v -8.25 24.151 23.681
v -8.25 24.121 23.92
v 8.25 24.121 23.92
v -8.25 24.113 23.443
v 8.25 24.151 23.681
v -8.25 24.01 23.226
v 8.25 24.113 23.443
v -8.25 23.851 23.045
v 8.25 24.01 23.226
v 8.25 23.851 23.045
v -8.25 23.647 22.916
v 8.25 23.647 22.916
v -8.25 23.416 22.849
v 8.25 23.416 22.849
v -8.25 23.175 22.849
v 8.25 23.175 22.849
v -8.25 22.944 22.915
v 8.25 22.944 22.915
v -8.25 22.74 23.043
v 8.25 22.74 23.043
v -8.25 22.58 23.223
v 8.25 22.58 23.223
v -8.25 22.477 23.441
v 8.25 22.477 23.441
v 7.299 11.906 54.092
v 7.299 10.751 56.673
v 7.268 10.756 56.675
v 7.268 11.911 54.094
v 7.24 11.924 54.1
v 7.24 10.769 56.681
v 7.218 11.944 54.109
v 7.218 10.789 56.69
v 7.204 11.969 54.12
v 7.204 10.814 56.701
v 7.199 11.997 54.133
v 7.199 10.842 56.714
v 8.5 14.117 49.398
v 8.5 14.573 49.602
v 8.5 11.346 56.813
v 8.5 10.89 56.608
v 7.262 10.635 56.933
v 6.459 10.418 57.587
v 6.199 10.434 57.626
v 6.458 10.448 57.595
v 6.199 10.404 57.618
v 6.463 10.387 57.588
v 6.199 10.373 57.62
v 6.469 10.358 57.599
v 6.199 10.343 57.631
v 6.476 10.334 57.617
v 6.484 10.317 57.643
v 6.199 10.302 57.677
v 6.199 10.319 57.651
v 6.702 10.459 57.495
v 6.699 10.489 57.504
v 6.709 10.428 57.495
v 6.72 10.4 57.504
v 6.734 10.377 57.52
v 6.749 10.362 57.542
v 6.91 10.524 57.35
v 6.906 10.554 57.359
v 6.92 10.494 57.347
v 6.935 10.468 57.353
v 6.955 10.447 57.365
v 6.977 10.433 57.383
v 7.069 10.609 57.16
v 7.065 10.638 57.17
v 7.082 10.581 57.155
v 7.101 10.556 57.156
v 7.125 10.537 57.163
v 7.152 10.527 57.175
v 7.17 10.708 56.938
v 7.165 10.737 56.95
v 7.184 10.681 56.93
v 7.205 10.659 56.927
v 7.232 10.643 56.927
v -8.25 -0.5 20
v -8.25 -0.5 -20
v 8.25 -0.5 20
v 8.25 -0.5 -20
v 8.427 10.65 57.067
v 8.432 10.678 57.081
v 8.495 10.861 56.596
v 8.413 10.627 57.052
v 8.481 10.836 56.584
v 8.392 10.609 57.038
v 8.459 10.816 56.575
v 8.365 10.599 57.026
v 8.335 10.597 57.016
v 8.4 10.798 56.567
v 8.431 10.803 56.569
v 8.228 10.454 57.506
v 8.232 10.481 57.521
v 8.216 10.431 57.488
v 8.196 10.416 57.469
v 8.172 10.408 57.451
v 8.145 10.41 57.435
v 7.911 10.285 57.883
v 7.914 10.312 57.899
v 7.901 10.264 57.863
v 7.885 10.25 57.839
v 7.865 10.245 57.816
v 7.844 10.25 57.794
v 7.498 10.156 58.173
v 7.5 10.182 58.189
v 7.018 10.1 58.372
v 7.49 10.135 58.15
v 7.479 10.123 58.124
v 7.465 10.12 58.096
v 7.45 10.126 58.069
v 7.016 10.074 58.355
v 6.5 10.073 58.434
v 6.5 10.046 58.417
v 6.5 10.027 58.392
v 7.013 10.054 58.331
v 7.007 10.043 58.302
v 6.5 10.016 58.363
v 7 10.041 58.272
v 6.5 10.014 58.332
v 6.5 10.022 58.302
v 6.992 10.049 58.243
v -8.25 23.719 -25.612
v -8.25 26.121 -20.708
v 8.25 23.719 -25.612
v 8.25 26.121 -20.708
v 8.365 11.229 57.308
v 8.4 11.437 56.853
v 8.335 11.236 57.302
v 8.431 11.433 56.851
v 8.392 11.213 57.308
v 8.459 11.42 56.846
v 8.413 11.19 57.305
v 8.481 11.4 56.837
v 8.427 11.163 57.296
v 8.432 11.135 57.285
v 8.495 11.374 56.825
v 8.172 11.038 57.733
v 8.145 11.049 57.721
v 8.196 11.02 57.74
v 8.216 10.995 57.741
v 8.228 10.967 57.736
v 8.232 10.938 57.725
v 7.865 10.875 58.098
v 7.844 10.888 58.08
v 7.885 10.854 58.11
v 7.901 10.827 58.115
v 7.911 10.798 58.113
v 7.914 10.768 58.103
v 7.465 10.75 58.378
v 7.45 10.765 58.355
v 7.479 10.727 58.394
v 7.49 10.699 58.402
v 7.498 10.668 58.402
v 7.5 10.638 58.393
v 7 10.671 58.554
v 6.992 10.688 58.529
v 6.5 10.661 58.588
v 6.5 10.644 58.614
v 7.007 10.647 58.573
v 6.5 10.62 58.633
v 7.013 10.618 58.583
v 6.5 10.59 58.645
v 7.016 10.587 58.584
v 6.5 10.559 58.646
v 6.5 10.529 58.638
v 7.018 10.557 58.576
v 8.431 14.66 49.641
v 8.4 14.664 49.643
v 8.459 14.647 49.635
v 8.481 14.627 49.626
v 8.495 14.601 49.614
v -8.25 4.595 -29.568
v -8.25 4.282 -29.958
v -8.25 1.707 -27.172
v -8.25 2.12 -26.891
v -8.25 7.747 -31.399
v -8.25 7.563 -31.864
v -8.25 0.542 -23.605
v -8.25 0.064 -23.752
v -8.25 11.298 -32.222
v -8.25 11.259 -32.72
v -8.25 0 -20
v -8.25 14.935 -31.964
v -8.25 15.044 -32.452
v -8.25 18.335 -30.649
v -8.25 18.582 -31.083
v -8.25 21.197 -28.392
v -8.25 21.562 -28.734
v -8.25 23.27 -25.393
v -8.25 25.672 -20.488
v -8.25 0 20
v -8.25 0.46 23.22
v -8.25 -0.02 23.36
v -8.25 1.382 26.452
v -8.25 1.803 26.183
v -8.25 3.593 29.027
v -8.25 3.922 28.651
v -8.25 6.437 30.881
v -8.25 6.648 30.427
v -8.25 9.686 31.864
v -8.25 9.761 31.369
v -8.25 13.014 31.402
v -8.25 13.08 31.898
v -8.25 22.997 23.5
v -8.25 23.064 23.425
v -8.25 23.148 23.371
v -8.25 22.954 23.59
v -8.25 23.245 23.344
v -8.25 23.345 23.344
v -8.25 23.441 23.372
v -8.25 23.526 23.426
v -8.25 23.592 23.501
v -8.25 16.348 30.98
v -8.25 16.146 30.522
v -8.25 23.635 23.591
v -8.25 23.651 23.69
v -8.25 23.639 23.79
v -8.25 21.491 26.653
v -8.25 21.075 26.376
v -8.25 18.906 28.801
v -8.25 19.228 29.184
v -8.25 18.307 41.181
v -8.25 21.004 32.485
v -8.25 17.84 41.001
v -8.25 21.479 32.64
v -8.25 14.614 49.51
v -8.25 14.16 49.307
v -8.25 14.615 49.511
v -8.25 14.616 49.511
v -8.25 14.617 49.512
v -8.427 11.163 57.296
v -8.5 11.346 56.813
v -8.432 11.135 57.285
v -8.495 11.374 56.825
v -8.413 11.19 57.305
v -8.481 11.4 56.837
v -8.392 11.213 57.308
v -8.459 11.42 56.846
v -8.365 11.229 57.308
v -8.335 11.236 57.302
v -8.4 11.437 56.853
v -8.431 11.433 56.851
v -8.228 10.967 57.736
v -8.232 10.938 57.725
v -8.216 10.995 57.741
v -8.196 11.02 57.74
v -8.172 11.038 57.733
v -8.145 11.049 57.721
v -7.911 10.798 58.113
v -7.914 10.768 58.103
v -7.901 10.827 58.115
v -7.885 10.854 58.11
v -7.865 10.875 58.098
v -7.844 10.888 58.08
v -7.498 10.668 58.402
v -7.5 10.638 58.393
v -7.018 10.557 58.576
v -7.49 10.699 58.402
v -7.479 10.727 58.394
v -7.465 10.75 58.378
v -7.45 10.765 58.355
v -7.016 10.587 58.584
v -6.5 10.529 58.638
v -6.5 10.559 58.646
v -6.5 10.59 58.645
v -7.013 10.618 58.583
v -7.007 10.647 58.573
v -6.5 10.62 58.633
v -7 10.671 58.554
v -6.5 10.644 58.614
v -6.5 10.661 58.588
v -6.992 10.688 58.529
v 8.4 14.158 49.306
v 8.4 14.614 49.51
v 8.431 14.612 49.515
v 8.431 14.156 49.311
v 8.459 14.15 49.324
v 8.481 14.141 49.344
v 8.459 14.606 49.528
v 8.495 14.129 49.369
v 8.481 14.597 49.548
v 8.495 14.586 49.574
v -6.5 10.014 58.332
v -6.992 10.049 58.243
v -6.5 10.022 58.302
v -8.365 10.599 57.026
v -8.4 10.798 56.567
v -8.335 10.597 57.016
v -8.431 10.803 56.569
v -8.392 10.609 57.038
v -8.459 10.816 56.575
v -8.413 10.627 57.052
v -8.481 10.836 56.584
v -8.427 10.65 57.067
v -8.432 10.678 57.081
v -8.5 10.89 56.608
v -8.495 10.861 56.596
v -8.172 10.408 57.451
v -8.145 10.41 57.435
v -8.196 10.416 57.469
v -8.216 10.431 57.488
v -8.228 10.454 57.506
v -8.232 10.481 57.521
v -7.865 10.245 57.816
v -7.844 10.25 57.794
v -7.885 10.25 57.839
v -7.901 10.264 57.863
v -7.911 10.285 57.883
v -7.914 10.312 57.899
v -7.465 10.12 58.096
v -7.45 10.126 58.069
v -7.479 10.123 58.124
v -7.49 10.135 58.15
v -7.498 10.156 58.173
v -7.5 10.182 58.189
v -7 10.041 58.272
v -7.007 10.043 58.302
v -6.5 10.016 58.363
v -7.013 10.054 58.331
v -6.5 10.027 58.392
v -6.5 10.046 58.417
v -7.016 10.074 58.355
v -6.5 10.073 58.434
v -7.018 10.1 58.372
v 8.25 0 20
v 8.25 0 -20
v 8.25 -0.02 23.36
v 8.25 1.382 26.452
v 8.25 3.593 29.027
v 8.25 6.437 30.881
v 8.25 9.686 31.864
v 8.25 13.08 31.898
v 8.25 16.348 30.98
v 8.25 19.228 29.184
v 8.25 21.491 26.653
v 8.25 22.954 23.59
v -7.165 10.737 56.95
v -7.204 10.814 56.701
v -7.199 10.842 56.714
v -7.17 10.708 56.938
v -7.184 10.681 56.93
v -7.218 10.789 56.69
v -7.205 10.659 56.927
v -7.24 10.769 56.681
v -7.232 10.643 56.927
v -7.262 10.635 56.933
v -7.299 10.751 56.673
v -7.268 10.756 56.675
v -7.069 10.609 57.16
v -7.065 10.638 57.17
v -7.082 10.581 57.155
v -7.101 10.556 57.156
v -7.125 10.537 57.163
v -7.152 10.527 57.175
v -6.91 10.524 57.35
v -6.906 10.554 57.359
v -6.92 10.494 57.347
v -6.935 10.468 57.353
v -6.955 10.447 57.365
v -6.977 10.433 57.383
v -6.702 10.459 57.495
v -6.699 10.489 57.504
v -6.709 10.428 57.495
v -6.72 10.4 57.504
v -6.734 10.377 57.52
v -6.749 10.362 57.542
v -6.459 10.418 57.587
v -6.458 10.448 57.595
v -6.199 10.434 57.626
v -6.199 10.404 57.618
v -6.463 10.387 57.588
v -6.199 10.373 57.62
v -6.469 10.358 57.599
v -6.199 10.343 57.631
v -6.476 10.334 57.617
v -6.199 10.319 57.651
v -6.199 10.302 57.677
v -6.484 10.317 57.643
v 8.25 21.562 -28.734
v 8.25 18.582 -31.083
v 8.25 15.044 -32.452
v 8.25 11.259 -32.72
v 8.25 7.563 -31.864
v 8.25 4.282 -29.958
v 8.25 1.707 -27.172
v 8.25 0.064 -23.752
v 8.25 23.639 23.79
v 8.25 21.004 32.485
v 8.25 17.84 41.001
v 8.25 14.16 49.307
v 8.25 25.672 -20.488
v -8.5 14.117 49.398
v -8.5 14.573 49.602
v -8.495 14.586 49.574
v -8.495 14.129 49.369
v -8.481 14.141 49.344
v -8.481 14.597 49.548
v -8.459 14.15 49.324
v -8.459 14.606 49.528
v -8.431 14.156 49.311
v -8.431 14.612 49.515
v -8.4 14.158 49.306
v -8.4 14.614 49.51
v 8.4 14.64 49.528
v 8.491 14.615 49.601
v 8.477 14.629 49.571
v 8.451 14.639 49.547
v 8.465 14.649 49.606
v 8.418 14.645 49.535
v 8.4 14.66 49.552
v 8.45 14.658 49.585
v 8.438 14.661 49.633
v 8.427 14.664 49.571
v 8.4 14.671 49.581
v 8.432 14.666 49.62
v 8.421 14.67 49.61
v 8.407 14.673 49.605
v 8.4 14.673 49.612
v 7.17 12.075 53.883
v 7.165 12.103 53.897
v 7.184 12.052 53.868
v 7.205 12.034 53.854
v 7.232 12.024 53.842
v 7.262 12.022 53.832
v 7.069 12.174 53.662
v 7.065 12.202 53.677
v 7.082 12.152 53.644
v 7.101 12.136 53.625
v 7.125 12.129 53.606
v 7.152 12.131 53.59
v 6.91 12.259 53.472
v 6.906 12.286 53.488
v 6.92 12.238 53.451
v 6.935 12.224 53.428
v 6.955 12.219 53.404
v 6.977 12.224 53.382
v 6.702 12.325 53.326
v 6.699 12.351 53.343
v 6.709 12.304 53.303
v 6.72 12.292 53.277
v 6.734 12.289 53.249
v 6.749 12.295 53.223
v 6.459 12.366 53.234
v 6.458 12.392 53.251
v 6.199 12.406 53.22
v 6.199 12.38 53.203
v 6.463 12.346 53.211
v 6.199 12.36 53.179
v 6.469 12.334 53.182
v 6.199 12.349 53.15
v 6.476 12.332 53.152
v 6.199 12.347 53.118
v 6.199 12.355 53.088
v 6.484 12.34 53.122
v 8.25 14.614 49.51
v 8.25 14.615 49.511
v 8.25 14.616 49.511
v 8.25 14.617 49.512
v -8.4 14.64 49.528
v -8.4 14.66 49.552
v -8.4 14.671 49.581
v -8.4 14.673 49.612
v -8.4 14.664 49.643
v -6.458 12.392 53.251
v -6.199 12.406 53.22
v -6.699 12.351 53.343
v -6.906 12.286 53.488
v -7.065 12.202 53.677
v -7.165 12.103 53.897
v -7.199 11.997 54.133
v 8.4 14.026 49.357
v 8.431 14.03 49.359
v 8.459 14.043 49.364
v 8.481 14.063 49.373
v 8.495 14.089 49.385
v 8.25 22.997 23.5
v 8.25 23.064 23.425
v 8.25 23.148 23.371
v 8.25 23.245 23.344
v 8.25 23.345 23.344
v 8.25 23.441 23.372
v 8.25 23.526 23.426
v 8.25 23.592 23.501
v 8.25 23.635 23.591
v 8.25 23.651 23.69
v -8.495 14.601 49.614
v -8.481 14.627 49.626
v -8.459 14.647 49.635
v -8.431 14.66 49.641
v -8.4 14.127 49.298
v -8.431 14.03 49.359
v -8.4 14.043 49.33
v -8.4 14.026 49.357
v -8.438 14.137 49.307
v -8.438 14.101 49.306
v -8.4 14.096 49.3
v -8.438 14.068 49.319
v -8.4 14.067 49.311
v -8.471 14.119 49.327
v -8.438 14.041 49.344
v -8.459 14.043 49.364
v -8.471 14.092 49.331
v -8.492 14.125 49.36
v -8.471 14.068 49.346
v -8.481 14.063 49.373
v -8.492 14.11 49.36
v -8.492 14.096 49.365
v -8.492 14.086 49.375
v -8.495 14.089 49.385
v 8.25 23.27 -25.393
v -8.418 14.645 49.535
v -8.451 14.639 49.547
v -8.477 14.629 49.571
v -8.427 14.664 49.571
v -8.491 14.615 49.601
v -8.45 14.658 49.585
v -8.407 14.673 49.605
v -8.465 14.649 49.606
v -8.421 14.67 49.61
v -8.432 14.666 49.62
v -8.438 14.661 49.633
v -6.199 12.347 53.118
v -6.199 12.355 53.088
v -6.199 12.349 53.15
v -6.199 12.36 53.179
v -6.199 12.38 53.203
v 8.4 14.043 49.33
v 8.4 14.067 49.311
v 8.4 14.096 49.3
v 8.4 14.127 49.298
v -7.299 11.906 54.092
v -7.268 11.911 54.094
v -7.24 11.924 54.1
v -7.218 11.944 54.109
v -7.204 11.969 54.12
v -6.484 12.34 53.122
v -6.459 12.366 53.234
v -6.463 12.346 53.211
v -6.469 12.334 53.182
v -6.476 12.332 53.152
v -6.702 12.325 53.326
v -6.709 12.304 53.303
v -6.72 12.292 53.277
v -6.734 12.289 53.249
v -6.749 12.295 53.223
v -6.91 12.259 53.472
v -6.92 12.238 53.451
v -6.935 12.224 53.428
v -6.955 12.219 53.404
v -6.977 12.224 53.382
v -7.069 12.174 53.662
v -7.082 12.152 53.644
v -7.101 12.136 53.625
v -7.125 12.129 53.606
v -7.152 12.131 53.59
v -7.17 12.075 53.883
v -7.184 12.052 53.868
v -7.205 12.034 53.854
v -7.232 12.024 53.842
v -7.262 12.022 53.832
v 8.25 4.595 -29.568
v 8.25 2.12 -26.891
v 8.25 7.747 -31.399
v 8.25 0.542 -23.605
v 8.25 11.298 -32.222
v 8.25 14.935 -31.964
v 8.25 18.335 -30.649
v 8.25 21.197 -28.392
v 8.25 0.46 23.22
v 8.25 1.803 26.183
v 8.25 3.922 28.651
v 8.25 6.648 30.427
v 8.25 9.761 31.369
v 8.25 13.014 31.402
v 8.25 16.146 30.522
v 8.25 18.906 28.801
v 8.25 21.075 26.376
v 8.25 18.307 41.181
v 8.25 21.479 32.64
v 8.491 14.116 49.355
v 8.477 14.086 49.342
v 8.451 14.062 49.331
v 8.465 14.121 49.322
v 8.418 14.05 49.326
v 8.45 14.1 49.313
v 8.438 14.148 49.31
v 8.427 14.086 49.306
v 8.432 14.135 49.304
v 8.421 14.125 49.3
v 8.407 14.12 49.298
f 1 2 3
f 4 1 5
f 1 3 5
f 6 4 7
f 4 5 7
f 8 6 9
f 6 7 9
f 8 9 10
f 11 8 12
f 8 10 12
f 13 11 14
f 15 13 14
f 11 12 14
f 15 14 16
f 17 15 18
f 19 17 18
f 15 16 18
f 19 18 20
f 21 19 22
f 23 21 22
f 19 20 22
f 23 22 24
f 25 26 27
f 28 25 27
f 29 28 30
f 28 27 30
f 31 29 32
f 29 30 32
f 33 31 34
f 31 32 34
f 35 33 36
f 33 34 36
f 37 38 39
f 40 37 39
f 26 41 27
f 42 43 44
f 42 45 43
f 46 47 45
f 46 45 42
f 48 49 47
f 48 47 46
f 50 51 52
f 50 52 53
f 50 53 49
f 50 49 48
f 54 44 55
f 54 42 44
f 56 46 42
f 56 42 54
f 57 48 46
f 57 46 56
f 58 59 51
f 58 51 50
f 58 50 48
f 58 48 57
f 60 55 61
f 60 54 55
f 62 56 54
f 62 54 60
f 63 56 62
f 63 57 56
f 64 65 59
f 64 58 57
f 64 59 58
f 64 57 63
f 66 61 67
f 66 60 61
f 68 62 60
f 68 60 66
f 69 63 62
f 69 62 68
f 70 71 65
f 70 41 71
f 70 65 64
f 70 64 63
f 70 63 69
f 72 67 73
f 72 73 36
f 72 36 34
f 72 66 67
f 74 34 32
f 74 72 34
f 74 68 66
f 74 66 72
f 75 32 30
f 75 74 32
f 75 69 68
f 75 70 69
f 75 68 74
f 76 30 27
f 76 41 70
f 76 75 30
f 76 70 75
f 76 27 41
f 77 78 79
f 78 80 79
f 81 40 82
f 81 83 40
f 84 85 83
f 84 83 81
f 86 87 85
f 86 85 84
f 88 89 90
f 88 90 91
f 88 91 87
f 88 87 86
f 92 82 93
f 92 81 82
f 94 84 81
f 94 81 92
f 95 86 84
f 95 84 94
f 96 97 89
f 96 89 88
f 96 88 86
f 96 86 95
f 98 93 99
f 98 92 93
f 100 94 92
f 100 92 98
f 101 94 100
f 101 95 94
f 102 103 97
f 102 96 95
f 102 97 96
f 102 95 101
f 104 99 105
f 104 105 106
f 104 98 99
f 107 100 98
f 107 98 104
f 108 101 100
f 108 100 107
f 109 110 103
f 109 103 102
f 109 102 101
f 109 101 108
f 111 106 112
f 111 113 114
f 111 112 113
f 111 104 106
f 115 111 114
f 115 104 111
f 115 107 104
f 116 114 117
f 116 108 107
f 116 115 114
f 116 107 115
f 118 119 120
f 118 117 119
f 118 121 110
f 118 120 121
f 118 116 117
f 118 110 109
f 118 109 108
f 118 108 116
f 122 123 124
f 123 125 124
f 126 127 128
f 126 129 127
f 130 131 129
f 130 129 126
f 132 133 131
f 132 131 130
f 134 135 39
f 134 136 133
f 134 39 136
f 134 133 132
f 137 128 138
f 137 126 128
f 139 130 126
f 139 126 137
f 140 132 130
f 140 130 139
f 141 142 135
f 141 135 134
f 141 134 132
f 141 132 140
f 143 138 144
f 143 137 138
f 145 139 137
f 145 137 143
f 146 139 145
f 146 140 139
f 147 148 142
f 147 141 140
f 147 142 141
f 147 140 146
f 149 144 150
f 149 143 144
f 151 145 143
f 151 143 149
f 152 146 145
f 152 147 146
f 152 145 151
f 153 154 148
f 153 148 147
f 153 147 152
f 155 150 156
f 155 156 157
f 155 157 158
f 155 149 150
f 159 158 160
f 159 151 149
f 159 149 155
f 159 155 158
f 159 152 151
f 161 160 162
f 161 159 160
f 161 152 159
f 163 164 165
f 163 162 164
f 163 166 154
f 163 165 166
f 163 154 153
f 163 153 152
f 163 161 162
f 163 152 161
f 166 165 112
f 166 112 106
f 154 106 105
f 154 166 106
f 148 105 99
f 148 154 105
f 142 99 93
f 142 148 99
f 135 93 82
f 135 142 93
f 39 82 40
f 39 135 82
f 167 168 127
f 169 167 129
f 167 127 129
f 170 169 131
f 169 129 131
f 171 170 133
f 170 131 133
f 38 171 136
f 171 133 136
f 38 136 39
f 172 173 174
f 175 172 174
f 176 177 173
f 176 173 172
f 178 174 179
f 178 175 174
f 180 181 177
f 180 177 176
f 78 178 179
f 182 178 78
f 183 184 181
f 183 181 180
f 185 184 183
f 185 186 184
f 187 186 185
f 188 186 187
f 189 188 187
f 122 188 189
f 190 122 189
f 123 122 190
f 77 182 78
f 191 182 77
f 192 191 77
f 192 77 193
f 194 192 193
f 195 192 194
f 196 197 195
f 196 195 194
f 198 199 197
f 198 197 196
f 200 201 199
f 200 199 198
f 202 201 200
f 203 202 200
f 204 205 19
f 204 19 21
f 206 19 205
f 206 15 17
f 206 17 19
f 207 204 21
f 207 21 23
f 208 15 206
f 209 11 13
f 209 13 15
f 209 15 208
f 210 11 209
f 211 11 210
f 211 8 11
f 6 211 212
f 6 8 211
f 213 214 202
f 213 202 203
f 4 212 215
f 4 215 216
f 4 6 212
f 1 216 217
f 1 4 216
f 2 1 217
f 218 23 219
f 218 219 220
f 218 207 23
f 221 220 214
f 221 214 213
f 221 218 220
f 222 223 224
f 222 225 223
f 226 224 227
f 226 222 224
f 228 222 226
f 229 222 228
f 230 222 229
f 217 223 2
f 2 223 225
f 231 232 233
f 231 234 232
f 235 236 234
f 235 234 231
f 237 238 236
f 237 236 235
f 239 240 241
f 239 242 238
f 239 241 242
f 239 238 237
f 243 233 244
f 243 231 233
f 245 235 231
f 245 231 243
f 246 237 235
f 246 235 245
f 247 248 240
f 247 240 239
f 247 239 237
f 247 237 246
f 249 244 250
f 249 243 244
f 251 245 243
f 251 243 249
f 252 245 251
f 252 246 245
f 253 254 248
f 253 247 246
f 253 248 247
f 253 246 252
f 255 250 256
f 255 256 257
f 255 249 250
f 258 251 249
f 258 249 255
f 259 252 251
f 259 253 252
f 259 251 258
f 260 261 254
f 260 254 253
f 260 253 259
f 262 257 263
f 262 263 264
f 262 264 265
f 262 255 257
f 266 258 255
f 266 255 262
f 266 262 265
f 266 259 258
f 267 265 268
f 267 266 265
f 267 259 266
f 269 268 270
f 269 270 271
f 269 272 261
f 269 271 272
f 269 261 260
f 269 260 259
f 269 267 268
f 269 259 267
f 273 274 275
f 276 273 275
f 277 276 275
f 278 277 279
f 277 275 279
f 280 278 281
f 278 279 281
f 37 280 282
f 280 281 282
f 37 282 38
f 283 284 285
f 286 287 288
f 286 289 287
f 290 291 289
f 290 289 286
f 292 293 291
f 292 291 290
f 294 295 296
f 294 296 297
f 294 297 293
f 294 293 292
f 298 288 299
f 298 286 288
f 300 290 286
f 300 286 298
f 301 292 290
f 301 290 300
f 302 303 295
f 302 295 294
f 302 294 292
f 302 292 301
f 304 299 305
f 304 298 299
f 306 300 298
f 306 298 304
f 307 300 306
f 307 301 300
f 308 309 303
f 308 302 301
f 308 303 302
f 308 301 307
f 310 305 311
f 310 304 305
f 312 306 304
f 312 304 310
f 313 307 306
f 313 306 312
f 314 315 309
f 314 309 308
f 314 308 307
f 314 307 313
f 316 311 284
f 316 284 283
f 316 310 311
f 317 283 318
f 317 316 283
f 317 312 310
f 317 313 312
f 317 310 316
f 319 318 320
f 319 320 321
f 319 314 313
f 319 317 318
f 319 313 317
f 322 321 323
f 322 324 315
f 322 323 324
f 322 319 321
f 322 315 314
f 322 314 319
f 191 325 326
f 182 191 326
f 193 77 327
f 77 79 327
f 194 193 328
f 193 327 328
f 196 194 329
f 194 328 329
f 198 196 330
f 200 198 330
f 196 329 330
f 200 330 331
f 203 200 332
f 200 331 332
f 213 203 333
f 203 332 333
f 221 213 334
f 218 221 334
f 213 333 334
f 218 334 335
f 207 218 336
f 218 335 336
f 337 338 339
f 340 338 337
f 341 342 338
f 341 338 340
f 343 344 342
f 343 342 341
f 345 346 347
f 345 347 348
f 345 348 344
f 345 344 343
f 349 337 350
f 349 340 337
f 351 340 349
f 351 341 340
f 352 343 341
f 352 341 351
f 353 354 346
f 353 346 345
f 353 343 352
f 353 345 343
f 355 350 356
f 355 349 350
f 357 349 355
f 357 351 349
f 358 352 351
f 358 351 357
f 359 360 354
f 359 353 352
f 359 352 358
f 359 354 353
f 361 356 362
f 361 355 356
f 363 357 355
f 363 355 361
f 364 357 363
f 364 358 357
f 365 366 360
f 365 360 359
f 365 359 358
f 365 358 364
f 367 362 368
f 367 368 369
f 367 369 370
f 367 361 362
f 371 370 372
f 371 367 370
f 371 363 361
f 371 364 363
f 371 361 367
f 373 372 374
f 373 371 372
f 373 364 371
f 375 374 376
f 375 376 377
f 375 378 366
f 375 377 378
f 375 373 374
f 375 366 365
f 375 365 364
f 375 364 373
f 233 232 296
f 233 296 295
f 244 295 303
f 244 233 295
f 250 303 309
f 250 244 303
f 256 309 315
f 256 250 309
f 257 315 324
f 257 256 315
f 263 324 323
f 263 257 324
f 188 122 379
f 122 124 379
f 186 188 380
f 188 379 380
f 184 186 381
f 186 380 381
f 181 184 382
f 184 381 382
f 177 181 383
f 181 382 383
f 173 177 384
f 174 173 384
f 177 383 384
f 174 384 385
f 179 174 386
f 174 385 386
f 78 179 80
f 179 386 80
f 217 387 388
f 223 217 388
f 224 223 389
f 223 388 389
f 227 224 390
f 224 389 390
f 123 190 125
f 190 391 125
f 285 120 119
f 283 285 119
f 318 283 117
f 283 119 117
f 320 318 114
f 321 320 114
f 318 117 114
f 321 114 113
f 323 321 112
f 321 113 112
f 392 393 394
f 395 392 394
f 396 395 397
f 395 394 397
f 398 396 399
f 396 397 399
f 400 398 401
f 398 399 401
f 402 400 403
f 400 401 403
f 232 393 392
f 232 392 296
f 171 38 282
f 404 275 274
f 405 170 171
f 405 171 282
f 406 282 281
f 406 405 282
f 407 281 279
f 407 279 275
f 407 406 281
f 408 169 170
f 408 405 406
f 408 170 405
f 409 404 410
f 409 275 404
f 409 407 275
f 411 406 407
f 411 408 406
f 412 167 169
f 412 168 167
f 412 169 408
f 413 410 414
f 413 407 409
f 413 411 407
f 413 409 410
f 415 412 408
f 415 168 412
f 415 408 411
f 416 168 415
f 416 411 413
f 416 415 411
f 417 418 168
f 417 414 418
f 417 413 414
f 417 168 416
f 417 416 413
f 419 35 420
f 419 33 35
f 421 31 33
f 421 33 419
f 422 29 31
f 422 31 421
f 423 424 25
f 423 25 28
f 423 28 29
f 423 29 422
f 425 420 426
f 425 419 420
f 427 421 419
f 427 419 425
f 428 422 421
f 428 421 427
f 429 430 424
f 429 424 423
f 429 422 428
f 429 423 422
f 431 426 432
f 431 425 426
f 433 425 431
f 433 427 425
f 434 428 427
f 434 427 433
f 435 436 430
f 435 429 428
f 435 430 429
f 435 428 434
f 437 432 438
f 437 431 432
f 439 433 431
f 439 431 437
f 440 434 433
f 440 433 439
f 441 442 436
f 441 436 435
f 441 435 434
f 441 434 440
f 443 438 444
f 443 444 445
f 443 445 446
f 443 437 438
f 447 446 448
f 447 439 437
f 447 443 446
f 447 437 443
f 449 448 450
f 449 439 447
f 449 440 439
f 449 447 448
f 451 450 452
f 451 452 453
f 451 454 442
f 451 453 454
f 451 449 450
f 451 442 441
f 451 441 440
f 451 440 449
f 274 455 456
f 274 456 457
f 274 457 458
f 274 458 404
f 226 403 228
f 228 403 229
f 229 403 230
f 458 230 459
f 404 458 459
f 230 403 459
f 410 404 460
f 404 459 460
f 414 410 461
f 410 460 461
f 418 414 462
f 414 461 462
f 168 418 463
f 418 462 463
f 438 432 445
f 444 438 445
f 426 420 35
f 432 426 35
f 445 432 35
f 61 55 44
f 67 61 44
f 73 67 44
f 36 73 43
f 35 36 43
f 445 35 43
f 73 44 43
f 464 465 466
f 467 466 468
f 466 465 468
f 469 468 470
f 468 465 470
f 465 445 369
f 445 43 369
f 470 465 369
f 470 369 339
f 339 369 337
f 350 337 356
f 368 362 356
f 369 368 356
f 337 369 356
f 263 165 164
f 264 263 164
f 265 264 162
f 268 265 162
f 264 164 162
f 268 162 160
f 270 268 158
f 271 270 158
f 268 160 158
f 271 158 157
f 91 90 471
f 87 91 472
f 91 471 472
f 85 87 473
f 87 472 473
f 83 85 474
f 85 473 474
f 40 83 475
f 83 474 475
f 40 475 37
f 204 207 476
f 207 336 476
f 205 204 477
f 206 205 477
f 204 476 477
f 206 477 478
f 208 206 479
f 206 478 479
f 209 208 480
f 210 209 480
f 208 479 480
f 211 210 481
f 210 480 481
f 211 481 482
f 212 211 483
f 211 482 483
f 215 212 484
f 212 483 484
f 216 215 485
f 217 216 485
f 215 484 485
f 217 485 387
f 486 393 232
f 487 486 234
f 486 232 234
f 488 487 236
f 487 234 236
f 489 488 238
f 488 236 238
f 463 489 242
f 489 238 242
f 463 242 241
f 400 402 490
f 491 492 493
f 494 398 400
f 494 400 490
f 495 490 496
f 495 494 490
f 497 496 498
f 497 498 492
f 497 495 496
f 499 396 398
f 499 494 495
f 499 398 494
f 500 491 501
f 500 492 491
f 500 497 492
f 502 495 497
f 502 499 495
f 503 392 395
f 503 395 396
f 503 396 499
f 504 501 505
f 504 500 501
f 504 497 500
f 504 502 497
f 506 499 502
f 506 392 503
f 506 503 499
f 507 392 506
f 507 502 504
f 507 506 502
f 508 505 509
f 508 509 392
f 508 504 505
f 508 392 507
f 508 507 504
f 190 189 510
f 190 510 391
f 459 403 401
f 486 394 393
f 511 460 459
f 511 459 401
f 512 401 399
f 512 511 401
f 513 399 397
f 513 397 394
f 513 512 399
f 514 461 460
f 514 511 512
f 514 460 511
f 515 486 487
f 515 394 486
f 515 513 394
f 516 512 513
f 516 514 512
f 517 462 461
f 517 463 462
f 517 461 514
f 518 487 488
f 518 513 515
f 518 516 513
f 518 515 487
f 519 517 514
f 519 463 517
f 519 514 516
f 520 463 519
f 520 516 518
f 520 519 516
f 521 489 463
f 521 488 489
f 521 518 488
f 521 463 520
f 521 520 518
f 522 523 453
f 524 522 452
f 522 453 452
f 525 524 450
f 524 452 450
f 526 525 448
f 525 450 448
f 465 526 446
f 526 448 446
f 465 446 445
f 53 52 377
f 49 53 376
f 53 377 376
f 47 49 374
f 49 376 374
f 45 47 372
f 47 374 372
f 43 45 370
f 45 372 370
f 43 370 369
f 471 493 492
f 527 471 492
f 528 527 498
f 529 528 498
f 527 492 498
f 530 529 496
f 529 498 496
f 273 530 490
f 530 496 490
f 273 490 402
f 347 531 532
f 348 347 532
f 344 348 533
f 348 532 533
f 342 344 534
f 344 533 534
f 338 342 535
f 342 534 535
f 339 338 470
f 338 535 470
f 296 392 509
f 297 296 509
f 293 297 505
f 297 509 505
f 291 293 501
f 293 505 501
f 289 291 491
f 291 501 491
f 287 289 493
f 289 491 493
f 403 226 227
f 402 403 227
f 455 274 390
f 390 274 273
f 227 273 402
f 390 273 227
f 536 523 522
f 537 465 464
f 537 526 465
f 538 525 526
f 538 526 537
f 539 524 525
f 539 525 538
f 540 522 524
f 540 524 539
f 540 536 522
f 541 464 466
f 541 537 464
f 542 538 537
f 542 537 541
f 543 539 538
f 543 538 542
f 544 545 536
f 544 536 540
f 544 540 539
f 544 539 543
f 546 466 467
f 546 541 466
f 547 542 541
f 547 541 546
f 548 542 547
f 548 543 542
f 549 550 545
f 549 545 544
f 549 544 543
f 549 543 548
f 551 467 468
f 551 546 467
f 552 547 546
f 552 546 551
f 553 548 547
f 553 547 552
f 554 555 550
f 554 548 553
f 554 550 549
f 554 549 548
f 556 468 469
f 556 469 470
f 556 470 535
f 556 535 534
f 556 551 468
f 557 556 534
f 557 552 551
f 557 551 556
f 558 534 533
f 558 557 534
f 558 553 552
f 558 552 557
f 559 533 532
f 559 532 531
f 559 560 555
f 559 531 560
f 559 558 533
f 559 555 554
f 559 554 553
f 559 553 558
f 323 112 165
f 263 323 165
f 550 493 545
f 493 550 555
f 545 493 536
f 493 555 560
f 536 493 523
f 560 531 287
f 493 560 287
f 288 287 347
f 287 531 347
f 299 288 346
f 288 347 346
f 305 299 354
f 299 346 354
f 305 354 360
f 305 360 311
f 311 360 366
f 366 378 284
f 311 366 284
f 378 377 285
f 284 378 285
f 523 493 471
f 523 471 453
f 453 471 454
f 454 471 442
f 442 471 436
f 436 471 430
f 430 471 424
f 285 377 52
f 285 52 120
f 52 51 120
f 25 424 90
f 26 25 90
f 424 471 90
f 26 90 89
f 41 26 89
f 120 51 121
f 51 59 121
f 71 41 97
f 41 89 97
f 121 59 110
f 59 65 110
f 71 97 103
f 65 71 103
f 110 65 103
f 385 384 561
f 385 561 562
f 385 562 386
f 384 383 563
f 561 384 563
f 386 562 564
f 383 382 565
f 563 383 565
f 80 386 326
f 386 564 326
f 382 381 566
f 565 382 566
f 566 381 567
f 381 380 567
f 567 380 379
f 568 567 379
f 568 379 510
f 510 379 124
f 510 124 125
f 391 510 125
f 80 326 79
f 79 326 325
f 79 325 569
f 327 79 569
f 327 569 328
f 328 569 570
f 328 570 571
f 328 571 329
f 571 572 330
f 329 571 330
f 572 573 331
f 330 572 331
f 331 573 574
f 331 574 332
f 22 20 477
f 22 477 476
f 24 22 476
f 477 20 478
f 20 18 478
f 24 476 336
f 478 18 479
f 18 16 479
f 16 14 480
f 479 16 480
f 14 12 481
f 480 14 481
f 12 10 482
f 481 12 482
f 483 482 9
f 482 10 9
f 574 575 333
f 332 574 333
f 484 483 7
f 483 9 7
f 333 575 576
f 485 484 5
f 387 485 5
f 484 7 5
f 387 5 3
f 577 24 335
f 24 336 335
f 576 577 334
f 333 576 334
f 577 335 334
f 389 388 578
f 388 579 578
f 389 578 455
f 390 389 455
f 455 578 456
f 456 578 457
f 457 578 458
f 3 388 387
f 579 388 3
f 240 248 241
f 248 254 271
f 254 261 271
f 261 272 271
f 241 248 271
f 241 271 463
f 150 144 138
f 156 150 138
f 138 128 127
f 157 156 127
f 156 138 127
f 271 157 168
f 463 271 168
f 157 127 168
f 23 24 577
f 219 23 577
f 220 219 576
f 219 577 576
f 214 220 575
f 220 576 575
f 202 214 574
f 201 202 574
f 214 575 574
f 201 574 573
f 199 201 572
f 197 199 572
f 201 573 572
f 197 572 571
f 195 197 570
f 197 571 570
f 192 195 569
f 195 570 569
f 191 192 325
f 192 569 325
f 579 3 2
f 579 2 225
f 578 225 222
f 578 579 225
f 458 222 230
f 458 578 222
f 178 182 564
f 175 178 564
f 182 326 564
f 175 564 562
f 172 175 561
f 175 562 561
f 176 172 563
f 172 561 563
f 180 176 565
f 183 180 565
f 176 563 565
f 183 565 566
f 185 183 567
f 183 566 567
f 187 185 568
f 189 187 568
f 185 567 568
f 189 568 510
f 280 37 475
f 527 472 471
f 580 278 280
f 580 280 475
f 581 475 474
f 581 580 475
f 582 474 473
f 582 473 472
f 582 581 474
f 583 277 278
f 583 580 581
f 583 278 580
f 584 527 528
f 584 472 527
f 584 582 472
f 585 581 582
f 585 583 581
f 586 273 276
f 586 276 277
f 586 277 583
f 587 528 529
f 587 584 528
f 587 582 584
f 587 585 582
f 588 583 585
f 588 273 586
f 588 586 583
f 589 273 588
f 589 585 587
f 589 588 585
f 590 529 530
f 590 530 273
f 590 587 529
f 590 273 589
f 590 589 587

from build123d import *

# Parameters (mm, degrees)
BOSS_EXTRUDE1_DEPTH = 8.25
BOSS_EXTRUDE2_DEPTH = 8.5
FILLET2_R           = 2
CUT_EXTRUDE1_DEPTH  = 0.1
FILLET1_R           = 0.1


with BuildPart() as part:
    # Sketch1 → Boss-Extrude1 (new, symmetric)
    with BuildSketch(Plane(origin=(0, 0, 0), x_dir=(0, 0, -1), z_dir=(1, 0, 0))):
        with BuildLine():
            Line((-20, 0), (20, 0))
            ThreePointArc((20, 0), (31.94314613143427, 9.491936676512388), (25.392516821689124, 23.269630860737195))
            Line((25.392516821689124, 23.269630860737195), (20.48767915496346, 25.67194333522964))
            Line((20.48767915496346, 25.67194333522964), (20.707608671089492, 26.12097675039667))
            Line((20.707608671089492, 26.12097675039667), (25.612446337815154, 23.71866427590423))
            ThreePointArc((25.612446337815154, 23.71866427590423), (32.4302378618011, 9.379057775878826), (20, -0.5))
            Line((20, -0.5), (-20, -0.4999999999999987))
            ThreePointArc((-20, -0.4999999999999987), (-31.863566841643475, 9.685729623859952), (-23.590234900340555, 22.953935409328388))
            ThreePointArc((-23.590234900340555, 22.953935409328388), (-23.354479596787012, 23.394160454012642), (-23.789870300203464, 23.638728621400347))
            ThreePointArc((-23.789870300203464, 23.638728621400347), (-36.8961810366091, 19.4394741124151), (-49.55557214404263, 14.040498622612501))
            Line((-49.55557214404263, 14.040498622612501), (-49.77289846768594, 14.4907977110545))
            ThreePointArc((-49.77289846768594, 14.4907977110545), (-37.070723460551015, 19.908019672894), (-23.920118407045663, 24.1214660558966))
            ThreePointArc((-23.920118407045663, 24.1214660558966), (-22.874461521184195, 23.534098465627046), (-23.440663680772627, 22.47683117514367))
            ThreePointArc((-23.440663680772627, 22.47683117514367), (-31.36932392713061, 9.761386358218672), (-20, 0))
        make_face()
    extrude(amount=BOSS_EXTRUDE1_DEPTH, both=True)

    # Sketch2 → Boss-Extrude2 (add, symmetric)
    with BuildSketch(Plane(origin=(0, 0, 0), x_dir=(0, 0, -1), z_dir=(1, 0, 0))):
        Polygon((-49.26537752455312, 14.066353693944993), (-58.392962295280306, 9.981357212528026), (-58.67891204897949, 10.620288146478929), (-49.5513272782523, 14.705284627895898), align=None)
    extrude(amount=BOSS_EXTRUDE2_DEPTH, both=True)

    # Fillet2
    fillet2_edges = [part.edges().sort_by_distance(p)[0] for p in [
        (-8.5, 10.300822679503478, 58.5359371721299),
        (8.5, 10.300822679503478, 58.5359371721299),
    ]]
    fillet(fillet2_edges, radius=FILLET2_R)

    # Sketch3 → Cut-Extrude1 (cut)
    with BuildSketch(Plane(origin=(0, 30.088237033082944, 13.465812205476922), x_dir=(1, 0, 0), z_dir=(0, -0.9127584770727193, -0.40849964814169676))):
        with BuildLine():
            Line((-6.1992171672518035, 48.336758954326044), (6.1992171672518035, 48.336758954326044))
            ThreePointArc((6.1992171672518035, 48.336758954326044), (6.9063239484383585, 48.04386573551259), (7.199217167251811, 47.33675895432604))
            Line((7.199217167251811, 47.33675895432604), (7.199217167251811, 44.50945894575458))
            ThreePointArc((7.199217167251811, 44.50945894575458), (6.9063239484383585, 43.80235216456803), (6.1992171672518035, 43.509458945754574))
            Line((6.1992171672518035, 43.509458945754574), (-6.1992171672518035, 43.509458945754574))
            ThreePointArc((-6.1992171672518035, 43.509458945754574), (-6.9063239484383585, 43.80235216456803), (-7.199217167251811, 44.50945894575458))
            Line((-7.199217167251811, 44.50945894575458), (-7.199217167251811, 47.33675895432604))
            ThreePointArc((-7.199217167251811, 47.33675895432604), (-6.906323948438358, 48.04386573551259), (-6.1992171672518035, 48.336758954326044))
        make_face()
    extrude(amount=-CUT_EXTRUDE1_DEPTH, mode=Mode.SUBTRACT)

    # Fillet1
    # the kernel refuses this fillet: 0.1 mm, written as the material it takes off along each edge
    with BuildSketch(Plane(origin=(-8.4, 14.573158815374455, 49.601753161145396), x_dir=(-1, 0, 0), z_dir=(0, 0.9127584770727193, 0.40849964814169704))) as fillet1_piece_1_section:
        Polygon((0, 0), (FILLET1_R * 1.02, 0), (FILLET1_R * 1.02, -FILLET1_R * 1.02), (0, -FILLET1_R * 1.02), align=None)
    fillet1_piece_1 = extrude(amount=FILLET1_R * 1.02, mode=Mode.PRIVATE)
    fillet1_piece_1 = fillet1_piece_1 - Plane(origin=(-8.4, 14.573158815374455, 49.601753161145396), x_dir=(0.7071067811865475, -0.28885287131331006, 0.6454177087236268), z_dir=(0, 0.9127584770727193, 0.40849964814169704)) * Sphere(FILLET1_R, mode=Mode.PRIVATE)
    add(fillet1_piece_1, mode=Mode.SUBTRACT)
    with BuildSketch(Plane(origin=(-8.4, 14.116779576838097, 49.39750333707456), x_dir=(0, 0.4084996481416934, -0.912758477072721), z_dir=(-1, 0, 0))) as fillet1_piece_2_section:
        Polygon((0, 0), (FILLET1_R * 1.02, 0), (FILLET1_R * 1.02, FILLET1_R * 1.02), (3.9e-16, FILLET1_R * 1.02), align=None)
    fillet1_piece_2 = extrude(amount=FILLET1_R * 1.02, mode=Mode.PRIVATE)
    fillet1_piece_2 = fillet1_piece_2 - Plane(origin=(-8.4, 14.116779576838097, 49.39750333707456), x_dir=(0, 0.35656483741031497, 0.9342705800369375), z_dir=(-1, 0, 0)) * Sphere(FILLET1_R, mode=Mode.PRIVATE)
    add(fillet1_piece_2, mode=Mode.SUBTRACT)
    with BuildSketch(Plane(origin=(8.4, 14.116779576838095, 49.39750333707456), x_dir=(1, 0, 0), z_dir=(0, 0.4084996481416934, -0.912758477072721))) as fillet1_piece_3_section:
        Polygon((0, 0), (FILLET1_R * 1.02, 0), (FILLET1_R * 1.02, FILLET1_R * 1.02), (0, FILLET1_R * 1.02), align=None)
    fillet1_piece_3 = extrude(amount=FILLET1_R * 1.02, mode=Mode.PRIVATE)
    fillet1_piece_3 = fillet1_piece_3 - Plane(origin=(8.4, 14.116779576838095, 49.39750333707456), x_dir=(-0.7071067811865475, 0.6454177087236256, 0.2888528713133125), z_dir=(0, 0.4084996481416934, -0.912758477072721)) * Sphere(FILLET1_R, mode=Mode.PRIVATE)
    add(fillet1_piece_3, mode=Mode.SUBTRACT)
    with BuildSketch(Plane(origin=(8.4, 14.573158815374455, 49.601753161145396), x_dir=(0, 0.4084996481416934, -0.912758477072721), z_dir=(0, 0.9127584770727193, 0.40849964814169704))) as fillet1_piece_4_section:
        Polygon((0, 0), (FILLET1_R * 1.02, 0), (FILLET1_R * 1.02, -FILLET1_R * 1.02), (0, -FILLET1_R * 1.02), align=None)
    fillet1_piece_4 = extrude(amount=FILLET1_R * 1.02, mode=Mode.PRIVATE)
    fillet1_piece_4 = fillet1_piece_4 - Plane(origin=(8.4, 14.573158815374455, 49.601753161145396), x_dir=(-0.7071067811865475, -0.28885287131331006, 0.6454177087236268), z_dir=(0, 0.9127584770727193, 0.40849964814169704)) * Sphere(FILLET1_R, mode=Mode.PRIVATE)
    add(fillet1_piece_4, mode=Mode.SUBTRACT)
    with BuildSketch(Plane(origin=(-8.5, 11.43728744276232, 56.853395094834056), x_dir=(1, 0, 0), z_dir=(0, 0.40849964814169704, -0.9127584770727193))) as fillet1_piece_5:
        with BuildLine():
            CenterArc((FILLET1_R, FILLET1_R), FILLET1_R, 180, 90)
            Line((0, FILLET1_R), (0, 0))
            Line((0, 0), (FILLET1_R, 0))
        make_face()
    extrude(amount=7.900000000000008, mode=Mode.SUBTRACT)
    with BuildSketch(Plane(origin=(-8.5, 14.025503729130824, 49.35665337226039), x_dir=(0, 0.9127584770727193, 0.40849964814169687), z_dir=(0, -0.40849964814169687, 0.9127584770727193))) as fillet1_piece_6:
        with BuildLine():
            CenterArc((FILLET1_R, -FILLET1_R), FILLET1_R, 90, 90)
            Line((0, -FILLET1_R), (0, 0))
            Line((0, 0), (FILLET1_R, 0))
        make_face()
    extrude(amount=7.9, mode=Mode.SUBTRACT)
    with BuildSketch(Plane(origin=(-8.5, 14.614008780188621, 49.51047731343813), x_dir=(0, -0.40849964814169337, 0.9127584770727208), z_dir=(0, -0.912758477072721, -0.4084996481416934))) as fillet1_piece_7:
        with BuildLine():
            CenterArc((FILLET1_R, -FILLET1_R), FILLET1_R, 90, 90)
            Line((1.45e-15, -FILLET1_R), (0, 0))
            Line((0, 0), (FILLET1_R, 0))
        make_face()
    extrude(amount=0.4999999999999936, mode=Mode.SUBTRACT)
    with BuildSketch(Plane(origin=(6.5, 10.620288146478929, 58.67891204897949), x_dir=(0, 0.4084996481416779, -0.9127584770727277), z_dir=(-1, 0, 0))) as fillet1_piece_8:
        with BuildLine():
            CenterArc((FILLET1_R, FILLET1_R), FILLET1_R, 179.99999999999815, 89.99999999999955)
            Line((2.51e-15, FILLET1_R), (0, 0))
            Line((0, 0), (FILLET1_R, 0))
        make_face()
    extrude(amount=13, mode=Mode.SUBTRACT)
    with BuildSketch(Plane(origin=(6.5, 9.981357212528026, 58.392962295280306), x_dir=(0, 0.9127584770727145, 0.40849964814170747), z_dir=(-1, 0, 0))) as fillet1_piece_9:
        with BuildLine():
            CenterArc((FILLET1_R, FILLET1_R), FILLET1_R, 179.9999999999996, 90.00000000000131)
            Line((0, FILLET1_R), (0, 0))
            Line((0, 0), (FILLET1_R, 0))
        make_face()
    extrude(amount=13, mode=Mode.SUBTRACT)
    with BuildSketch(Plane(origin=(8.5, 14.025503729130824, 49.35665337226039), x_dir=(0, 0.9127584770727193, 0.40849964814169687), z_dir=(0, -0.40849964814169687, 0.9127584770727193))) as fillet1_piece_10:
        with BuildLine():
            CenterArc((FILLET1_R, FILLET1_R), FILLET1_R, 180, 90)
            Line((0, FILLET1_R), (0, 0))
            Line((0, 0), (FILLET1_R, 0))
        make_face()
    extrude(amount=7.9, mode=Mode.SUBTRACT)
    with BuildSketch(Plane(origin=(8.5, 11.43728744276232, 56.853395094834056), x_dir=(-1, 0, 0), z_dir=(0, 0.40849964814169704, -0.9127584770727193))) as fillet1_piece_11:
        with BuildLine():
            CenterArc((FILLET1_R, -FILLET1_R), FILLET1_R, 90, 90)
            Line((0, -FILLET1_R), (0, 0))
            Line((0, 0), (FILLET1_R, 0))
        make_face()
    extrude(amount=7.900000000000008, mode=Mode.SUBTRACT)
    with BuildSketch(Plane(origin=(8.5, 14.614008780188621, 49.51047731343813), x_dir=(-1, -5.93e-15, 1.325e-14), z_dir=(0, -0.912758477072721, -0.4084996481416934))) as fillet1_piece_12:
        with BuildLine():
            CenterArc((FILLET1_R, -FILLET1_R), FILLET1_R, 90.00000000000082, 89.99999999999918)
            Line((1.45e-15, -FILLET1_R), (0, 0))
            Line((0, 0), (FILLET1_R, 0))
        make_face()
    extrude(amount=0.499999999999992, mode=Mode.SUBTRACT)
    with BuildSketch(Plane(origin=(-8.4, 14.066353693944993, 49.26537752455312), x_dir=(0, 0.9127584770727116, 0.40849964814171413), z_dir=(1, 0, 0))) as fillet1_piece_13:
        with BuildLine():
            CenterArc((FILLET1_R, FILLET1_R), FILLET1_R, 180, 89.99999999999864)
            Line((2.35e-15, FILLET1_R), (0, 0))
            Line((0, 0), (FILLET1_R, 0))
        make_face()
    extrude(amount=16.799999999999997, mode=Mode.SUBTRACT)
    with BuildSketch(Plane(origin=(-8.4, 14.705284627895898, 49.5513272782523), x_dir=(0, -0.40849964814173395, 0.9127584770727026), z_dir=(1, 0, 0))) as fillet1_piece_14_section:
        with BuildLine():
            CenterArc((FILLET1_R, FILLET1_R), FILLET1_R, 179.99999999999554, 90.00000000000318)
            Line((-2.13e-15, FILLET1_R), (0, 0))
            Line((0, 0), (FILLET1_R, 0))
        make_face()
    fillet1_piece_14 = extrude(amount=16.799999999999997, mode=Mode.PRIVATE)
    fillet1_piece_14 = fillet1_piece_14 - Plane(origin=(-8.325000000000001, -119.19916199032235, -14.749433901316772), x_dir=(0, 0.9005981768840285, 0.4346526472865017), z_dir=(1, 0, 0)) * Cylinder(148.4457365480458, 35, mode=Mode.PRIVATE)
    add(fillet1_piece_14, mode=Mode.SUBTRACT)
    with BuildSketch(Plane(origin=(-8.4, 14.705284627895898, 49.5513272782523), x_dir=(0, -0.40849964814173395, 0.9127584770727026), z_dir=(1, 0, 0))) as fillet1_piece_15_section:
        with BuildLine():
            CenterArc((FILLET1_R, FILLET1_R), FILLET1_R, 179.99999999999554, 90.00000000000318)
            Line((-2.13e-15, FILLET1_R), (0, 0))
            Line((0, 0), (FILLET1_R, 0))
        make_face()
    fillet1_piece_15 = extrude(amount=16.799999999999997, mode=Mode.PRIVATE)
    fillet1_piece_15 = split(fillet1_piece_15, bisect_by=Plane(origin=(-8.25, 14.615931564484248, 49.51135087212141), z_dir=(-1, 0, 0)), keep=Keep.TOP, mode=Mode.PRIVATE)
    add(fillet1_piece_15, mode=Mode.SUBTRACT)
    with BuildSketch(Plane(origin=(-8.4, 14.705284627895898, 49.5513272782523), x_dir=(0, -0.40849964814173395, 0.9127584770727026), z_dir=(1, 0, 0))) as fillet1_piece_16_section:
        with BuildLine():
            CenterArc((FILLET1_R, FILLET1_R), FILLET1_R, 179.99999999999554, 90.00000000000318)
            Line((-2.13e-15, FILLET1_R), (0, 0))
            Line((0, 0), (FILLET1_R, 0))
        make_face()
    fillet1_piece_16 = extrude(amount=16.799999999999997, mode=Mode.PRIVATE)
    fillet1_piece_16 = split(fillet1_piece_16, bisect_by=Plane(origin=(8.25, 14.615931564484251, 49.51135087212142), z_dir=(1, 0, 0)), keep=Keep.TOP, mode=Mode.PRIVATE)
    add(fillet1_piece_16, mode=Mode.SUBTRACT)
    with BuildSketch(Plane(origin=(-6.5, 10.79835650881142, 56.56744534113487), x_dir=(-1, 0, 0), z_dir=(0, 0.40849964814169437, -0.9127584770727205))) as fillet1_piece_17:
        with BuildLine():
            CenterArc((2 - FILLET1_R, FILLET1_R), FILLET1_R, 270, 90)
            Line((2 - FILLET1_R, -4.52e-15), (2, 0))
            Line((2, 0), (2, FILLET1_R))
        make_face()
    revolve(axis=Axis((-6.5, 10.79835650881142, 56.56744534113487), (0, 0.9127584770727205, 0.40849964814169437)), revolution_arc=89.99999999999994, mode=Mode.SUBTRACT)
    with BuildSketch(Plane(origin=(6.5, 10.79835650881142, 56.56744534113487), x_dir=(1, 0, 0), z_dir=(0, 0.40849964814169437, -0.9127584770727205))) as fillet1_piece_18:
        with BuildLine():
            CenterArc((2 - FILLET1_R, -FILLET1_R), FILLET1_R, 0, 90)
            Line((2 - FILLET1_R, 4.52e-15), (2, 0))
            Line((2, 0), (2, -FILLET1_R))
        make_face()
    revolve(axis=Axis((6.5, 10.79835650881142, 56.56744534113487), (0, -0.9127584770727205, -0.40849964814169437)), revolution_arc=89.99999999999994, mode=Mode.SUBTRACT)
    with BuildSketch(Plane(origin=(-6.5, 11.437287442762319, 56.853395094834056), x_dir=(-1, 0, 0), z_dir=(0, 0.40849964814169437, -0.9127584770727205))) as fillet1_piece_19:
        with BuildLine():
            CenterArc((2 - FILLET1_R, -FILLET1_R), FILLET1_R, 359.99999999999835, 90.00000000000165)
            Line((2, -FILLET1_R), (2, 0))
            Line((2, 0), (2 - FILLET1_R, 1.62e-15))
        make_face()
    revolve(axis=Axis((-6.5, 11.437287442762319, 56.853395094834056), (0, 0.9127584770727205, 0.40849964814169437)), revolution_arc=90, mode=Mode.SUBTRACT)
    with BuildSketch(Plane(origin=(6.5, 11.437287442762319, 56.853395094834056), x_dir=(1, 0, 0), z_dir=(0, 0.40849964814169437, -0.9127584770727205))) as fillet1_piece_20:
        with BuildLine():
            CenterArc((2 - FILLET1_R, FILLET1_R), FILLET1_R, 270, 90.00000000000166)
            Line((2, FILLET1_R), (2, 0))
            Line((2, 0), (2 - FILLET1_R, -1.62e-15))
        make_face()
    revolve(axis=Axis((6.5, 11.437287442762319, 56.853395094834056), (0, -0.9127584770727205, -0.40849964814169437)), revolution_arc=90, mode=Mode.SUBTRACT)
    with BuildSketch(Plane(origin=(7.199217167251811, 10.751187656072442, 56.67284021818597), x_dir=(1, -1.3009e-13, -5.822e-14), z_dir=(0, 0.4084996481416968, -0.9127584770727194))) as fillet1_piece_21:
        with BuildLine():
            CenterArc((FILLET1_R, -FILLET1_R), FILLET1_R, 89.99999999999183, 90.00000000000465)
            Line((-1.425e-14, -FILLET1_R), (0, 0))
            Line((0, 0), (FILLET1_R, 0))
        make_face()
    extrude(amount=2.827300008571454, mode=Mode.SUBTRACT)
    with BuildSketch(Plane(origin=(6.199217167251807, 11.9061387147649, 54.092198168134594), x_dir=(1, -3.55e-15, 7.11e-15), z_dir=(-7.936821341612911e-15, -0.4084996481416968, 0.9127584770727194))) as fillet1_piece_22:
        with BuildLine():
            CenterArc((1.0000000000000018 + FILLET1_R, FILLET1_R), FILLET1_R, 179.99999999999, 90.00000000001)
            Line((1.0000000000000018, FILLET1_R), (1.0000000000000018, 0))
            Line((1.0000000000000018, 0), (1.0000000000000018 + FILLET1_R, -1.422e-14))
        make_face()
    revolve(axis=Axis((6.199217167251807, 11.9061387147649, 54.092198168134594), (0, 0.9127584770727194, 0.4084996481416968)), revolution_arc=90.00000000000061, mode=Mode.SUBTRACT)
    with BuildSketch(Plane(origin=(6.1992171672518035, 12.3146383629066, 53.17943969106187), x_dir=(0, 0.4084996481415774, -0.9127584770727728), z_dir=(-1, 0, 0))) as fillet1_piece_23:
        with BuildLine():
            CenterArc((FILLET1_R, -FILLET1_R), FILLET1_R, 89.99999999999143, 90.00000000001319)
            Line((-1.135e-14, -FILLET1_R), (0, 0))
            Line((0, 0), (FILLET1_R, 0))
        make_face()
    extrude(amount=12.398434334503607, mode=Mode.SUBTRACT)
    with BuildSketch(Plane(origin=(-6.199217167251807, 11.9061387147649, 54.092198168134594), x_dir=(3.5527136788004915e-15, 0.40849964814169826, -0.9127584770727186), z_dir=(1, -1.45e-15, 3.24e-15))) as fillet1_piece_24:
        with BuildLine():
            CenterArc((1.0000000000000027 + FILLET1_R, FILLET1_R), FILLET1_R, 179.9999999999887, 90.00000000001234)
            Line((1.0000000000000038, FILLET1_R), (1.0000000000000027, 0))
            Line((1.0000000000000027, 0), (1.0000000000000027 + FILLET1_R, -1.323e-14))
        make_face()
    revolve(axis=Axis((-6.199217167251807, 11.9061387147649, 54.092198168134594), (0, 0.9127584770727194, 0.4084996481416968)), revolution_arc=90.00000000000061, mode=Mode.SUBTRACT)
    with BuildSketch(Plane(origin=(-7.199217167251811, 11.906138714764896, 54.0921981681346), x_dir=(-1, -1.3009e-13, -5.822e-14), z_dir=(0, -0.4084996481416968, 0.9127584770727194))) as fillet1_piece_25:
        with BuildLine():
            CenterArc((FILLET1_R, -FILLET1_R), FILLET1_R, 89.99999999999183, 90.0000000000091)
            Line((-1.425e-14, -FILLET1_R), (0, 0))
            Line((0, 0), (FILLET1_R, 0))
        make_face()
    extrude(amount=2.827300008571454, mode=Mode.SUBTRACT)
    with BuildSketch(Plane(origin=(-6.199217167251806, 10.751187656072442, 56.67284021818597), x_dir=(-1, 0, 0), z_dir=(0, 0.4084996481416968, -0.9127584770727194))) as fillet1_piece_26:
        with BuildLine():
            CenterArc((1.0000000000000062 + FILLET1_R, FILLET1_R), FILLET1_R, 179.99999999999537, 90.00000000000466)
            Line((1.0000000000000062, FILLET1_R), (1.0000000000000062, 0))
            Line((1.0000000000000062, 0), (1.0000000000000062 + FILLET1_R, -1.425e-14))
        make_face()
    revolve(axis=Axis((-6.199217167251806, 10.751187656072442, 56.67284021818597), (0, 0.9127584770727194, 0.4084996481416968)), revolution_arc=90.00000000000016, mode=Mode.SUBTRACT)
    with BuildSketch(Plane(origin=(-6.1992171672518035, 10.342688007930743, 57.585598695258696), x_dir=(0, -0.40849964814183753, 0.9127584770726563), z_dir=(1, 0, 0))) as fillet1_piece_27:
        with BuildLine():
            CenterArc((FILLET1_R, -FILLET1_R), FILLET1_R, 89.99999999999226, 90.00000000001148)
            Line((-1.642e-14, -FILLET1_R), (0, 0))
            Line((0, 0), (FILLET1_R, 0))
        make_face()
    extrude(amount=12.398434334503607, mode=Mode.SUBTRACT)
    with BuildSketch(Plane(origin=(6.199217167251807, 10.751187656072439, 56.672840218185975), x_dir=(-3.552713678800497e-15, -0.40849964814169537, 0.9127584770727201), z_dir=(-1, 1.45e-15, -3.24e-15))) as fillet1_piece_28:
        with BuildLine():
            CenterArc((1.0000000000000013 + FILLET1_R, FILLET1_R), FILLET1_R, 179.99999999998826, 90.00000000001057)
            Line((1.000000000000001, FILLET1_R), (1.0000000000000013, -2e-17))
            Line((1.0000000000000013, -2e-17), (1.0000000000000013 + FILLET1_R, -1.557e-14))
        make_face()
    revolve(axis=Axis((6.199217167251807, 10.751187656072439, 56.672840218185975), (0, 0.9127584770727194, 0.4084996481416968)), revolution_arc=90.00000000000061, mode=Mode.SUBTRACT)


solid = part.part
